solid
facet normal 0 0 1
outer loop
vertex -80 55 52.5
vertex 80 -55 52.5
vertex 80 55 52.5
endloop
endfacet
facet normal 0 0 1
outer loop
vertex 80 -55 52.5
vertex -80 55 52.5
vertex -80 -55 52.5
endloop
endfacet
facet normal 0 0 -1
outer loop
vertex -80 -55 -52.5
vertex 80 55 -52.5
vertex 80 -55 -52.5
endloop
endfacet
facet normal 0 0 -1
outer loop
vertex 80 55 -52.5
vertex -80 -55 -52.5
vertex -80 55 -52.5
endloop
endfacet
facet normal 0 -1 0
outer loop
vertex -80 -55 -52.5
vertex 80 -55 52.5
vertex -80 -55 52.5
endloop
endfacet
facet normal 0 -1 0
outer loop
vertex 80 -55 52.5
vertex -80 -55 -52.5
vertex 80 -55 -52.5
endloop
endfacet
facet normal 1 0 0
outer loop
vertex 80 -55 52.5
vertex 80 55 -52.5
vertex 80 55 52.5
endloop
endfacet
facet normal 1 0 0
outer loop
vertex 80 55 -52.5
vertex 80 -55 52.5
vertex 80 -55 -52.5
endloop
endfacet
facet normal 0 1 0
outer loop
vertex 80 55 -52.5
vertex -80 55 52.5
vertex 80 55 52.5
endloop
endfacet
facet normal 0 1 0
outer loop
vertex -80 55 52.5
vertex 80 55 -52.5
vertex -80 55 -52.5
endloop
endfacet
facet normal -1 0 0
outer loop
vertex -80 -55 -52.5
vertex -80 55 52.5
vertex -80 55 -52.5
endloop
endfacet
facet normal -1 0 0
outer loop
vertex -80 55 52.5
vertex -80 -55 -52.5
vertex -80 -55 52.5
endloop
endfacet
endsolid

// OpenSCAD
// 993 123 113 51 supplier-envelope guide; not an OEM heat-shield surface.
envelope_mm = [160.000000, 110.000000, 105.000000];
supplier_declared_mass_kg = 0.230000;

module supplier_envelope_guide() {
    cube(envelope_mm, center = true);
}

supplier_envelope_guide();
